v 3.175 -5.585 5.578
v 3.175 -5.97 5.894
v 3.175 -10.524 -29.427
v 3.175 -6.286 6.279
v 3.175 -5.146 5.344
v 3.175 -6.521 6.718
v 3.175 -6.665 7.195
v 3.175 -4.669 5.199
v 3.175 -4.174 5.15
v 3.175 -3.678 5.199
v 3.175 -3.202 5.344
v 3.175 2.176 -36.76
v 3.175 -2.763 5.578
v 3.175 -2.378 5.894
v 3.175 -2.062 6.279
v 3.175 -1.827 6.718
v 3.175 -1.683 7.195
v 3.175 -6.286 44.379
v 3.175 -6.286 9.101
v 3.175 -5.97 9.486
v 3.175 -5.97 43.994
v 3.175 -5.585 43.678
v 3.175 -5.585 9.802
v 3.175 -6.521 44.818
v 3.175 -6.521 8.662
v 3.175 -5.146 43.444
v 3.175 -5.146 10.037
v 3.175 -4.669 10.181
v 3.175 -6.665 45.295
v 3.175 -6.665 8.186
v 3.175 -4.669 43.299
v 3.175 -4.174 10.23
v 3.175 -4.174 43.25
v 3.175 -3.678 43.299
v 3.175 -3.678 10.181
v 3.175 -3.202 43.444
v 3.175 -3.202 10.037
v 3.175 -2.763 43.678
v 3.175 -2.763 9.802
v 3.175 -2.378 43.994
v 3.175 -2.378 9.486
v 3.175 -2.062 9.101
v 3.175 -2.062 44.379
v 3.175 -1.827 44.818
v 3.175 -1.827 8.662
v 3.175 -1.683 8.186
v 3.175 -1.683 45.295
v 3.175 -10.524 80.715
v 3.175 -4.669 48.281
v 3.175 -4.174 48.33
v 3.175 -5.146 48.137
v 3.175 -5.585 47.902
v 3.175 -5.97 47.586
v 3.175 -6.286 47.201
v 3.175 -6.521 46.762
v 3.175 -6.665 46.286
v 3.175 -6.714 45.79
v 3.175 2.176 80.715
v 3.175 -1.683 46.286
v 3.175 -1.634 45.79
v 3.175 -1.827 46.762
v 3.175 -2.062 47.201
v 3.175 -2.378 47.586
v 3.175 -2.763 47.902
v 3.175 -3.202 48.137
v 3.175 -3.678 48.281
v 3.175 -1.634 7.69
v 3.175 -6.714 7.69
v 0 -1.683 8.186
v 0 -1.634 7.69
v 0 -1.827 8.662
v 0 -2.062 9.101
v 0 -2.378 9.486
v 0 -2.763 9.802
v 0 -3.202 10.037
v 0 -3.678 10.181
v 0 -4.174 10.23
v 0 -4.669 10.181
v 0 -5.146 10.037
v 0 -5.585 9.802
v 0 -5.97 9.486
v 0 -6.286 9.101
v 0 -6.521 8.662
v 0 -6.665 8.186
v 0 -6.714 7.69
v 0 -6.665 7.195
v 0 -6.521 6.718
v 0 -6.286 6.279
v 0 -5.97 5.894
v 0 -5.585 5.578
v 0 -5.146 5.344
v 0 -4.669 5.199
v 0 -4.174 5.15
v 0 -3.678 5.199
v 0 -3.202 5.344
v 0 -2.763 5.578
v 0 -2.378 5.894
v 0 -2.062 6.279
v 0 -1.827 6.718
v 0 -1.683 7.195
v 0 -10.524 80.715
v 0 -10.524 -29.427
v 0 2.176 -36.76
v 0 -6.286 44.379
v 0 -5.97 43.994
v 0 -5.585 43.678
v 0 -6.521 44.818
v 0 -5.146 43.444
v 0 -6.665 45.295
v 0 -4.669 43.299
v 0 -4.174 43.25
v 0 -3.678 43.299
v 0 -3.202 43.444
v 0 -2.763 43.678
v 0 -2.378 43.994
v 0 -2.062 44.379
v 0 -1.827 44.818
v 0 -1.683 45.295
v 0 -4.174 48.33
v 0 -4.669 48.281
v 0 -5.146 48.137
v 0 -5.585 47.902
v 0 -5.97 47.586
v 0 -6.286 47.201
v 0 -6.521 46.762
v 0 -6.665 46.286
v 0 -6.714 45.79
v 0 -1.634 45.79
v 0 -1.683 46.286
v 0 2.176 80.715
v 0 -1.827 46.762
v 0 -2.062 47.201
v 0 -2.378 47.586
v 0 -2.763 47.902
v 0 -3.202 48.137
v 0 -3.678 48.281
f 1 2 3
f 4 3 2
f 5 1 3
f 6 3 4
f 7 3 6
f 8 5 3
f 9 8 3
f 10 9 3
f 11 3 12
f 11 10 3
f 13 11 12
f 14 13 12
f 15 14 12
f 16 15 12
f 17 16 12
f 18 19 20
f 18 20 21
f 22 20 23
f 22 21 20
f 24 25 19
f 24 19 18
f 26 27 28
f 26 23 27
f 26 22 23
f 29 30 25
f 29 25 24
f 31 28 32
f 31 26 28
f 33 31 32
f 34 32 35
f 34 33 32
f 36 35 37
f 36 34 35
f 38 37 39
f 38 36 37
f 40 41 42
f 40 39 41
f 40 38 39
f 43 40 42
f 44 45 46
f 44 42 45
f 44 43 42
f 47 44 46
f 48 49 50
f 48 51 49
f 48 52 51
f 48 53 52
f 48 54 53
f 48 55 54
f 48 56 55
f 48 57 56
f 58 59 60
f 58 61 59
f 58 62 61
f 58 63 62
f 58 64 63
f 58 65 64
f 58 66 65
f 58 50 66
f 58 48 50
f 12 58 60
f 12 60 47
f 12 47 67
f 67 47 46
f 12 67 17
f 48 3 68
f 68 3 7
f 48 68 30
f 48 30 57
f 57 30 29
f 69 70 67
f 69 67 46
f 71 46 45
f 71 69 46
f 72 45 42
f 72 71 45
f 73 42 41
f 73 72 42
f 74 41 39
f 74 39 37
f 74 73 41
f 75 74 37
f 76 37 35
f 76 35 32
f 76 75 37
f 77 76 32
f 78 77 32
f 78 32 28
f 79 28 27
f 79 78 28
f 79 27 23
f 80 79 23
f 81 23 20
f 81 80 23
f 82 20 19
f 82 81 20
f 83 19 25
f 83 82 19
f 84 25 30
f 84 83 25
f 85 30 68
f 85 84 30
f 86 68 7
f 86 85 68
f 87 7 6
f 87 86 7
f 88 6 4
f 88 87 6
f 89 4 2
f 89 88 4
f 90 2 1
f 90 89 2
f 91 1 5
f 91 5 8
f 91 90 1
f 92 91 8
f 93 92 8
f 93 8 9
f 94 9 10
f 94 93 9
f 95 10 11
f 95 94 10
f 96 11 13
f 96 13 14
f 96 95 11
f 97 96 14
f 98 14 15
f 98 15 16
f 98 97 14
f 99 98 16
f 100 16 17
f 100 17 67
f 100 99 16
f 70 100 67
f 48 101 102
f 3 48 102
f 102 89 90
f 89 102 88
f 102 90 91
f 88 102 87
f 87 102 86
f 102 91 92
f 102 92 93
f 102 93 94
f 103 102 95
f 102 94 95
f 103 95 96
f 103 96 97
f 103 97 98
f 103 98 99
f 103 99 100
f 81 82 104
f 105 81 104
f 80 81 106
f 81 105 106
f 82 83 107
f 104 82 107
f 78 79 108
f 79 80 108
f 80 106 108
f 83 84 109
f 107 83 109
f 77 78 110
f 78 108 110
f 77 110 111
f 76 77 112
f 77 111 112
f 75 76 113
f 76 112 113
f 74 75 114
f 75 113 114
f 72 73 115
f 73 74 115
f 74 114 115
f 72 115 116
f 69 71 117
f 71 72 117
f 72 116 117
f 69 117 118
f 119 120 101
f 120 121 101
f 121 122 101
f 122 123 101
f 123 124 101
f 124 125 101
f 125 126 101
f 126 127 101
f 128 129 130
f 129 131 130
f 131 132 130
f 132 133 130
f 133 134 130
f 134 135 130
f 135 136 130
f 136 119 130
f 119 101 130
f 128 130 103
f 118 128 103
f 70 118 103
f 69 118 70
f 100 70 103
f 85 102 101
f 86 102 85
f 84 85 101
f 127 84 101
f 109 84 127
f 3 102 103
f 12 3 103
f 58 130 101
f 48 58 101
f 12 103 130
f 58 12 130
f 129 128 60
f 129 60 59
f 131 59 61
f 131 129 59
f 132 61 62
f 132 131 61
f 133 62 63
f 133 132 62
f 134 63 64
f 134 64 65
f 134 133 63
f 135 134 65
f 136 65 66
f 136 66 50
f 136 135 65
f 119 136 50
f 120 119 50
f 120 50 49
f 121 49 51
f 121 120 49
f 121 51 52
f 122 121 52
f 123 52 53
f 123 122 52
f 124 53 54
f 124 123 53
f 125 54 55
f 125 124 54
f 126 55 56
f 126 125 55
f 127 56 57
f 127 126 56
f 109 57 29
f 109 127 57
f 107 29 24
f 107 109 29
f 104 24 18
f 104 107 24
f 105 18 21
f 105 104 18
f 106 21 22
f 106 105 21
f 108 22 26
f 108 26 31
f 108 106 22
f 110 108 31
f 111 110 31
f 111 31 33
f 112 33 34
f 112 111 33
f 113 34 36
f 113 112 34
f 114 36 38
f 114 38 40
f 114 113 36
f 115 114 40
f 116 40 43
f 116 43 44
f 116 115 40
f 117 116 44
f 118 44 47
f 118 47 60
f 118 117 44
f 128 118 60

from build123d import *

# Parameters (mm, degrees)
F0_R     = 2.54
F1_DEPTH = 3.175


with BuildPart() as f1:
    # F0 (on Right) → F1 (new body)
    with BuildSketch(Plane.YZ):
        Polygon((2.176032, -36.759793), (2.176032, 80.715207), (-10.523968, 80.715207), (-10.523968, -29.427444), align=None)
        with Locations((-4.173968, 7.690207)):
            Circle(F0_R, mode=Mode.SUBTRACT)
        with Locations((-4.173968, 45.790207)):
            Circle(F0_R, mode=Mode.SUBTRACT)
    extrude(amount=F1_DEPTH)


solid = f1.part
